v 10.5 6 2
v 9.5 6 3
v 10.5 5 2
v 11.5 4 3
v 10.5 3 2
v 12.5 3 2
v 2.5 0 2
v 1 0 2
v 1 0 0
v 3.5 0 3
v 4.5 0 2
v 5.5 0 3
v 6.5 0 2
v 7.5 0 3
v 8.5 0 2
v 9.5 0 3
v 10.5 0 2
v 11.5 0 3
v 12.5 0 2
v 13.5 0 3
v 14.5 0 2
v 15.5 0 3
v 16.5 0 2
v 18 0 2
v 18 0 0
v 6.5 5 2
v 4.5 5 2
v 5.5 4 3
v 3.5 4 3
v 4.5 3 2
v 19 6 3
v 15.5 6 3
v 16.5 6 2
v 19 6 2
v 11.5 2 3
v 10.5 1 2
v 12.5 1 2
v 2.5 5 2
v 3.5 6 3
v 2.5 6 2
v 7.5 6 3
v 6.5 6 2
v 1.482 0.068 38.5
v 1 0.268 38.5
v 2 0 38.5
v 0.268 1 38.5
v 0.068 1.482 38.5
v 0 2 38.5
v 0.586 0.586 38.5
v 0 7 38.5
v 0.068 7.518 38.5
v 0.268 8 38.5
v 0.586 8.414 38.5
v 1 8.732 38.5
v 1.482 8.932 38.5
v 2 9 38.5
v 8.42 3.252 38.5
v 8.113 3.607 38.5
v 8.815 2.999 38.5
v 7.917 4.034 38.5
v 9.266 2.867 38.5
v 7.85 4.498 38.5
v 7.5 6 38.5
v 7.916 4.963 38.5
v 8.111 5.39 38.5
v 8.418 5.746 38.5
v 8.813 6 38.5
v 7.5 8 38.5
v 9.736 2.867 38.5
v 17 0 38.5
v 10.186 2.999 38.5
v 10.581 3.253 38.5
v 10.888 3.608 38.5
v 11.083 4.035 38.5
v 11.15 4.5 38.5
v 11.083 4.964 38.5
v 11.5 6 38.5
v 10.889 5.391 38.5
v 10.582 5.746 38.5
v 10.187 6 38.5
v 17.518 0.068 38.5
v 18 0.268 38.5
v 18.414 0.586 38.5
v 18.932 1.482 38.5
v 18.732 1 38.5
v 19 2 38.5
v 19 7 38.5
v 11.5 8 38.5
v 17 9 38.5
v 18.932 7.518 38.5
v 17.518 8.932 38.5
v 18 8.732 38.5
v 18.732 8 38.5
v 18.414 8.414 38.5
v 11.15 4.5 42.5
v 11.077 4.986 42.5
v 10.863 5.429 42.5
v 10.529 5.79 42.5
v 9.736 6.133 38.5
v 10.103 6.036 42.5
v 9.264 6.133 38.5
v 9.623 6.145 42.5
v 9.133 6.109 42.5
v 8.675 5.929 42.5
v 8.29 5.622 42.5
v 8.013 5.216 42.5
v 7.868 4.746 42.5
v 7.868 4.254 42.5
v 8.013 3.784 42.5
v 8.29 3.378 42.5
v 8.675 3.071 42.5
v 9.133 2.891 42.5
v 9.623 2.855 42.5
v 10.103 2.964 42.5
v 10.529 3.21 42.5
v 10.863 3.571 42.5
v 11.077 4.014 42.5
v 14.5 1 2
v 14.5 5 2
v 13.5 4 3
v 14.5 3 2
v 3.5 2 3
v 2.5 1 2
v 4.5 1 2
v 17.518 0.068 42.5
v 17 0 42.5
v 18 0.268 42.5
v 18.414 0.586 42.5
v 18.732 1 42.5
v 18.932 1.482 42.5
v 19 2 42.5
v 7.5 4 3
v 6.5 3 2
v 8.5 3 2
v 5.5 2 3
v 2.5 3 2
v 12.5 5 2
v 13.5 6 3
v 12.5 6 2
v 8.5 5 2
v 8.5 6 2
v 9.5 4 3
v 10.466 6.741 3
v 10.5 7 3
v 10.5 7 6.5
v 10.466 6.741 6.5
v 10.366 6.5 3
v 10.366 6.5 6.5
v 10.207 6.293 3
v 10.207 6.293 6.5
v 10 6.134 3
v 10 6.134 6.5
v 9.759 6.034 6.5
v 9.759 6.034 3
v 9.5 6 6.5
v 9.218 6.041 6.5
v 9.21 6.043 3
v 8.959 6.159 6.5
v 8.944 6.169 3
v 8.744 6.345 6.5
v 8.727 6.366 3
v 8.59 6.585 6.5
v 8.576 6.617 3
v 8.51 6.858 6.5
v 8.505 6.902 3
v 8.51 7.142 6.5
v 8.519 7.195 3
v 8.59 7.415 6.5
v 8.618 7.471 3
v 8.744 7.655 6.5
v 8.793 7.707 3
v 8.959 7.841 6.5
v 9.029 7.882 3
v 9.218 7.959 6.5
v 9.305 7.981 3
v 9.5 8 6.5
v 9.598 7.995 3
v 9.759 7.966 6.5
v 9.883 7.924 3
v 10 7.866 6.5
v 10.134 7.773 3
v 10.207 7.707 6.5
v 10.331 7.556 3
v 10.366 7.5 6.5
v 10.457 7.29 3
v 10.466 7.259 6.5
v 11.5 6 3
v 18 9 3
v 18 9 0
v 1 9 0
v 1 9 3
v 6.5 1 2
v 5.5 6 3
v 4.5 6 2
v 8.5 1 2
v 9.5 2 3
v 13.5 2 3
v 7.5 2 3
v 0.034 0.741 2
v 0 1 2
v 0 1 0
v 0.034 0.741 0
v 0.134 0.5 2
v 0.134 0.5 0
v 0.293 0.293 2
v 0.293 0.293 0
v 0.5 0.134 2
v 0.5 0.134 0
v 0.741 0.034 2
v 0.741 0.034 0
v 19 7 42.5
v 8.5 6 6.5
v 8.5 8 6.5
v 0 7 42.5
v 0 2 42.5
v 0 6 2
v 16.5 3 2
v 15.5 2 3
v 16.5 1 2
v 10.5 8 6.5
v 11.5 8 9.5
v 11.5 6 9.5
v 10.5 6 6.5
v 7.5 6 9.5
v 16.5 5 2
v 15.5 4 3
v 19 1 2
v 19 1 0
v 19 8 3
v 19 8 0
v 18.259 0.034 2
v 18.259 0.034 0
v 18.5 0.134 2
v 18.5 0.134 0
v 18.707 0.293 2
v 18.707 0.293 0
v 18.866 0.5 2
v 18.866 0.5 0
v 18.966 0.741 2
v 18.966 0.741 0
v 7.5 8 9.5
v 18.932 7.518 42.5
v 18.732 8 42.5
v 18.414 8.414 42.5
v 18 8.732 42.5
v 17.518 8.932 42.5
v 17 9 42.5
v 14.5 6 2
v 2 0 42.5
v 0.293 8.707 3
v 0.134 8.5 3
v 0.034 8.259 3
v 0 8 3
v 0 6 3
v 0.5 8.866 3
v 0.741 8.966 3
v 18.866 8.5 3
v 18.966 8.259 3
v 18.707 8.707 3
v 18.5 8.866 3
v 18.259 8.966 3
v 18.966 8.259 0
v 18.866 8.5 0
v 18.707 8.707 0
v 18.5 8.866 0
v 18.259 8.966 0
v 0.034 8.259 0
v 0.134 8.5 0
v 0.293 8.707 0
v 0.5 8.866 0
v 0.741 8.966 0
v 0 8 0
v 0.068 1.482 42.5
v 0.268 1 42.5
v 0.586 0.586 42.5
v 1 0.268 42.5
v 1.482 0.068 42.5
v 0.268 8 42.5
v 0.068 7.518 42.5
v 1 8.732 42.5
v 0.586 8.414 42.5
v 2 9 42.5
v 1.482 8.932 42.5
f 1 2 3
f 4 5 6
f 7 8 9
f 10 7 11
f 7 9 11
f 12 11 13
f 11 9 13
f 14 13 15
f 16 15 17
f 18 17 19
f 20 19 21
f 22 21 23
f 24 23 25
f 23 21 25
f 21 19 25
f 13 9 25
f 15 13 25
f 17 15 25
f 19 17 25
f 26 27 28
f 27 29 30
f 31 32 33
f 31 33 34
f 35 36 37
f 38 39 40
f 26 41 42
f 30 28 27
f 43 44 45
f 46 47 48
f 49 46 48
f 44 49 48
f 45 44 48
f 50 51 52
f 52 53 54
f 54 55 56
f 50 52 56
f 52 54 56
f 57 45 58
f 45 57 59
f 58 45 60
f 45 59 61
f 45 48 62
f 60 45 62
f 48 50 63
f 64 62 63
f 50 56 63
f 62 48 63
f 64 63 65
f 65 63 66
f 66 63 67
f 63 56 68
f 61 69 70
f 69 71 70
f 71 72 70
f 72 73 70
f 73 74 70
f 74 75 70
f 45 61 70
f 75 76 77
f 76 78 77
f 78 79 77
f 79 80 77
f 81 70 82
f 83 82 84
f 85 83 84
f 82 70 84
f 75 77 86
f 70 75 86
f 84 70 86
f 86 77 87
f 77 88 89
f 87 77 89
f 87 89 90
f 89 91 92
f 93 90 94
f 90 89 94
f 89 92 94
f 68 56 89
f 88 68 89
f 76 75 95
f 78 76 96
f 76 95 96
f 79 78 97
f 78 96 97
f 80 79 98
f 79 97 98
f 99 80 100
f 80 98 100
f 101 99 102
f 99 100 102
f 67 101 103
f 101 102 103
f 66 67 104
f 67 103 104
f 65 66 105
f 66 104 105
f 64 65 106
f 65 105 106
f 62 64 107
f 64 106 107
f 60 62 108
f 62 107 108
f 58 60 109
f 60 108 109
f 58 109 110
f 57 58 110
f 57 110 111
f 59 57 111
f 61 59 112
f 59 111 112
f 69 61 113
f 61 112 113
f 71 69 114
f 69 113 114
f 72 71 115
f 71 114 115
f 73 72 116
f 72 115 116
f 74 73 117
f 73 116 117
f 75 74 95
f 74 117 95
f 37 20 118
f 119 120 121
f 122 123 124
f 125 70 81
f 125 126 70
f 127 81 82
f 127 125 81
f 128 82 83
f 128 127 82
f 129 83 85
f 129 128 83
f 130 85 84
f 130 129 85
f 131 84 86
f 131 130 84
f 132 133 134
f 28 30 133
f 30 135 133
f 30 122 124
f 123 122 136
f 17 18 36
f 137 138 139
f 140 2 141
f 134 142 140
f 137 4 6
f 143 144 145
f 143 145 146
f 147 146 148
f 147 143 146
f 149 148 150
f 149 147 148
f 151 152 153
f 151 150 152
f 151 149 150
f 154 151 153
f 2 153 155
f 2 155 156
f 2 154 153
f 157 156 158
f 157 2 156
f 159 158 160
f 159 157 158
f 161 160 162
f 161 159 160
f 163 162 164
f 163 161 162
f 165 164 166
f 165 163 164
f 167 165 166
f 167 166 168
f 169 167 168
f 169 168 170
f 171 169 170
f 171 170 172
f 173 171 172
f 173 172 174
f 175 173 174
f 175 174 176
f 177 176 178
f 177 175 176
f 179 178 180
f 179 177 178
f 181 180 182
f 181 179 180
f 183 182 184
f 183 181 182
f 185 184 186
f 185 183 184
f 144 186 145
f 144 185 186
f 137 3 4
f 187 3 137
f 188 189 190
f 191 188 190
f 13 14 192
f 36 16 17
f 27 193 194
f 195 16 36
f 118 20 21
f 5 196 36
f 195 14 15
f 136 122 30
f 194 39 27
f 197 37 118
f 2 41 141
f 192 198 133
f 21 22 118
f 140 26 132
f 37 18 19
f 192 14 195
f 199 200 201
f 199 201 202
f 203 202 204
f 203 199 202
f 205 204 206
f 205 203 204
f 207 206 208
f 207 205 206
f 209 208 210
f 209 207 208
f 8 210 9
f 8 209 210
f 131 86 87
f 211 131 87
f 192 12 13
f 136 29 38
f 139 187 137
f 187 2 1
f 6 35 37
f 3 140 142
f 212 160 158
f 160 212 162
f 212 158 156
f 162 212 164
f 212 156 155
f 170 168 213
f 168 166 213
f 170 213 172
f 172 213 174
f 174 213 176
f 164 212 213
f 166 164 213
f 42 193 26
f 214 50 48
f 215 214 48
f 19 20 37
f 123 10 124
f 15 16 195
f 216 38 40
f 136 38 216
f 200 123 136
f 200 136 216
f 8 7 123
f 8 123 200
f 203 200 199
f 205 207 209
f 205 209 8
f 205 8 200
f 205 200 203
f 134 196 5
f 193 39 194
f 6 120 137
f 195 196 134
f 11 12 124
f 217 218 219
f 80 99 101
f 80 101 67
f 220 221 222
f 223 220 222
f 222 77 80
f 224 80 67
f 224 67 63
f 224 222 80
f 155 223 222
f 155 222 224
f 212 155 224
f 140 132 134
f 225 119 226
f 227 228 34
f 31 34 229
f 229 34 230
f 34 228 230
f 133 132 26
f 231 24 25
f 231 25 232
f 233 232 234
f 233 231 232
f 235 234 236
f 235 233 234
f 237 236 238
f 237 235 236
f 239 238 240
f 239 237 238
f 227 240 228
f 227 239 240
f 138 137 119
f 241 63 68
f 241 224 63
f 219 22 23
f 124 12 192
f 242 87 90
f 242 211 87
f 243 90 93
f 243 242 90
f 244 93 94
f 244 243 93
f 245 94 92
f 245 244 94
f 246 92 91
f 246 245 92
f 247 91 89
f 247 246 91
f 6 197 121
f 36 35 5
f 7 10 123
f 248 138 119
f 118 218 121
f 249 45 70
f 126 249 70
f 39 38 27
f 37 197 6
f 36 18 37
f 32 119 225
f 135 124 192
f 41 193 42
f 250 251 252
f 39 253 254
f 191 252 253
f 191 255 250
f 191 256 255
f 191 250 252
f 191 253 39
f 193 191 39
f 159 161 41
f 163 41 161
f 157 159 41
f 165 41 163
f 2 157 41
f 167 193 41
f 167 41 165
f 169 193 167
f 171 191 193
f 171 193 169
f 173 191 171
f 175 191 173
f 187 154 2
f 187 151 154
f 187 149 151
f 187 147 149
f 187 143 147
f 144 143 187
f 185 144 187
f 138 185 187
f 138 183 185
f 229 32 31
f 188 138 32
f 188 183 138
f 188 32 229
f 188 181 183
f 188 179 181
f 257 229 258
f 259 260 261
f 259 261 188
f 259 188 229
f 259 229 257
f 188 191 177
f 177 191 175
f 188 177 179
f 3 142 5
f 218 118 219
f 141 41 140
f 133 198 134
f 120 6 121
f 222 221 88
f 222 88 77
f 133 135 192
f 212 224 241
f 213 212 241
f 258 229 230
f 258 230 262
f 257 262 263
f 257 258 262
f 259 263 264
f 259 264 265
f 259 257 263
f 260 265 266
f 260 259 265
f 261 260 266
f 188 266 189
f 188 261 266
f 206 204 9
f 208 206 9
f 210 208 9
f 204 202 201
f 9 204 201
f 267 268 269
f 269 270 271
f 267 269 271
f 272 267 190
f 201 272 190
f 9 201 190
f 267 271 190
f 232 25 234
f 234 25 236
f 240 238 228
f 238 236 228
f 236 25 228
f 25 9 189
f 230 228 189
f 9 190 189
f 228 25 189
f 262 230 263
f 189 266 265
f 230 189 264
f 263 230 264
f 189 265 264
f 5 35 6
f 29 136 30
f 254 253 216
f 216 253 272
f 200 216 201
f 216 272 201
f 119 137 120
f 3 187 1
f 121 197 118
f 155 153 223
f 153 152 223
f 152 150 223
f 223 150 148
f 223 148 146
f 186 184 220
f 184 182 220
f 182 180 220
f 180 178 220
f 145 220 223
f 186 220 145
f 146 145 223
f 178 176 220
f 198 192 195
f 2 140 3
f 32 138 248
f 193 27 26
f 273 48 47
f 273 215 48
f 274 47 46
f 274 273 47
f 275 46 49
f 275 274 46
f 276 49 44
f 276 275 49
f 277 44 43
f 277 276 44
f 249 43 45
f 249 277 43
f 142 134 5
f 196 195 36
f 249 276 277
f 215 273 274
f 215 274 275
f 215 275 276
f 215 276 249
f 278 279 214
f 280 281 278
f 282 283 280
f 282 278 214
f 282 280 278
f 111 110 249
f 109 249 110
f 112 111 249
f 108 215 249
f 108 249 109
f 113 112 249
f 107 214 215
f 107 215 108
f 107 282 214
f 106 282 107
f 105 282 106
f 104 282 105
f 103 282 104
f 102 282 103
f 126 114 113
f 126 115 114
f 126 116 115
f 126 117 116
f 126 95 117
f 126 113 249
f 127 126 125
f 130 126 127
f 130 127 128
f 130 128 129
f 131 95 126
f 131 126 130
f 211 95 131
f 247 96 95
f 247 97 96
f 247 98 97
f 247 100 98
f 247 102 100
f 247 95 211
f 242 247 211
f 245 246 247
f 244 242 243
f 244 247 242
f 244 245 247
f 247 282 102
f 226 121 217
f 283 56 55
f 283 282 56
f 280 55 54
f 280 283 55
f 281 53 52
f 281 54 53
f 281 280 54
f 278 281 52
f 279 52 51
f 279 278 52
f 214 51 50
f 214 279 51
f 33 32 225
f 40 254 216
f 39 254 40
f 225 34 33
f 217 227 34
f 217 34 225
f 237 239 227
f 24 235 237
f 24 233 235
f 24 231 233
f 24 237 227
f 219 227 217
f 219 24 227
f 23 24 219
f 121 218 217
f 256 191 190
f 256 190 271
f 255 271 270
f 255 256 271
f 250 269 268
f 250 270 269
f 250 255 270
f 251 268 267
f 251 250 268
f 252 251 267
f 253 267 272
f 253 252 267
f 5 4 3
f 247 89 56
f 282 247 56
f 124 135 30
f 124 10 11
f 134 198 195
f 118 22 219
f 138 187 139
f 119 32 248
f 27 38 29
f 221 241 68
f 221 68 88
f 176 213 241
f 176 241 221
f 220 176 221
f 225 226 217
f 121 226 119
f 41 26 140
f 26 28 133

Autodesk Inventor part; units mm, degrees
ref_plane "YZ Plane" through (0, 0, 0) normal (1, 0, 0) x (0, 1, 0)
ref_plane "XZ Plane" through (0, 0, 0) normal (0, 1, 0) x (-1, 0, 0)
ref_plane "XY Plane" through (0, 0, 0) normal (0, 0, 1) x (1, 0, 0)
sketch "Sketch1" plane through (0, 0, 0) normal (0, 0, 1) x (1, 0, 0)
  line L0 (0, 0) -> (19, 0)
  line L1 (19, 0) -> (19, 9)
  line L2 (19, 9) -> (0, 9)
  line L3 (0, 9) -> (0, 0)
  point P0 (9.5, 9)
  dimension "d0" = 19
  dimension "d1" = 9
extrude "Extrusion1" add sketch "Sketch1" along normal blind 3
sketch "Sketch2" plane through (0, 0, 3) normal (0, 0, 1) x (1, 0, 0)
  line L0 (19, 9) -> (0, 9) projected
  circle A0 centre (9.5, 7) radius 1
  point P0 (0, 0)
  point P1 (9.5, 9)
  dimension "d4" = 2
  dimension "d5" = 2
extrude "Extrusion2" add sketch "Sketch2" along normal blind 3.5
sketch "Sketch6" plane through (9.5, 7, 6.5) normal (0, 0, 1) x (1, 0, 0)
  circle A0 centre (0, 0) radius 1 projected
  line L0 (2, -1) -> (-2, -1)
  line L1 (-2, -1) -> (-2, 1)
  line L2 (-2, 1) -> (2, 1)
  line L3 (2, 1) -> (2, -1)
  line L4 (2, -1) -> (-2, 1) construction
  line L5 (-2, -1) -> (2, 1) construction
  point P0 (-9.5, -7)
  dimension "d13" = 4
extrude "Extrusion5" add sketch "Sketch6" along normal blind 32
sketch "Sketch7" plane through (9.5, 7, 38.5) normal (0, 0, 1) x (1, 0, 0)
  circle A0 centre (0, 0) radius 1 projected
  line L0 (-9.5, -7) -> (9.5, -7) projected
  line L1 (9.5, -7) -> (9.5, 2) projected
  line L2 (9.5, 2) -> (-9.5, 2) projected
  line L3 (-9.5, 2) -> (-9.5, -7) projected
  arc A1 (0, -1) -> (0, 1) centre (0, 0) ccw projected
  arc A2 (0, 1) -> (0, -1) centre (0, 0) ccw projected
extrude "Extrusion6" add sketch "Sketch7" along normal blind 4 contours A0 | L3 L2 L1 L0
sketch "Sketch8" plane through (9.5, 7, 42.5) normal (0, 0, 1) x (1, 0, 0)
  line L0 (-9.5, -7) -> (9.5, -7) projected
  line L1 (9.5, -7) -> (9.5, 2) projected
  line L2 (9.5, 2) -> (-9.5, 2) projected
  line L3 (-9.5, 2) -> (-9.5, -7) projected
  circle A0 centre (0, -2.5) radius 1.65
  dimension "d18" = 3.3
extrude "Extrusion7" cut sketch "Sketch8" against normal blind 4 contours A0
sketch "Sketch10" plane through (0, 0, 0) normal (-1, 0, 0) x (0, 0, 1)
  line L0 (0, 0) -> (3, 0) projected
  line L1 (3, 9) -> (3, 0) projected
  line L2 (3, 0) -> (2, 0)
  line L3 (2, 0) -> (2, 6)
  line L4 (2, 6) -> (3, 6)
  line L5 (3, 6) -> (3, 0)
  line L6 (3, 0) -> (2, 1)
  line L7 (3, 0) -> (4.4142, 0) construction
  line L8 (2, 1) -> (3, 2)
  line L9 (3, 0) -> (3, 9) projected
  line L10 (3, 2) -> (2, 3)
  line L11 (2, 3) -> (3, 4)
  line L12 (2, 5) -> (3, 4)
  line L13 (2, 5) -> (3, 6)
  dimension "d23" = 1
  dimension "d24" = 6
  dimension "d25" = 135
  dimension "d26" = 90
extrude "Extrusion8" cut sketch "Sketch10" against normal up to next contours L6 L8 L1 | L10 L11 L1 | L12 L13 L1
sketch "Sketch11" plane through (0, 0, 0) normal (0, -1, 0) x (1, 0, 0)
  line L0 (0, 3) -> (9.5, 3) projected
  line L1 (0, 3) -> (19, 3)
  line L2 (19, 3) -> (19, 2)
  line L3 (19, 2) -> (8.5, 2)
  line L4 (0, 2) -> (0, 3)
  line L5 (0, 3) -> (0, 2) projected
  line L6 (0, 3) -> (1.4142, 3) construction
  line L7 (19, 3) -> (0, 3) projected
  line L8 (9.5, 3) -> (8.5, 2)
  line L9 (9.5, 3) -> (10.9142, 3) construction
  line L10 (10.5, 2) -> (8.5, 2)
  line L11 (9.5, 3) -> (10.5, 2)
  line L12 (10.5, 2) -> (8.5, 2)
  line L13 (8.5, 2) -> (0, 2)
  line L14 (7.5, 3) -> (8.5, 2)
  line L15 (8.5, 2) -> (6.5, 2)
  line L16 (7.5, 3) -> (6.5, 2)
  line L17 (5.5, 3) -> (6.5, 2)
  line L18 (6.5, 2) -> (4.5, 2)
  line L19 (5.5, 3) -> (4.5, 2)
  line L20 (3.5, 3) -> (4.5, 2)
  line L21 (4.5, 2) -> (2.5, 2)
  line L22 (3.5, 3) -> (2.5, 2)
  line L23 (12.5, 2) -> (10.5, 2)
  line L24 (11.5, 3) -> (12.5, 2)
  line L25 (11.5, 3) -> (10.5, 2)
  line L26 (14.5, 2) -> (12.5, 2)
  line L27 (13.5, 3) -> (14.5, 2)
  line L28 (13.5, 3) -> (12.5, 2)
  line L29 (16.5, 2) -> (14.5, 2)
  line L30 (15.5, 3) -> (16.5, 2)
  line L31 (15.5, 3) -> (14.5, 2)
  point P0 (0, 0)
  dimension "d30" = 135
  dimension "d33" = 2
  dimension "d40" = 2
extrude "Extrusion9" cut sketch "Sketch11" against normal blind 6 contours L0 L22 L13 L4 | L0 L19 L20 | L0 L16 L17 | L0 L8 L14 | L1 L25 L11 | L1 L28 L24 | L1 L31 L27 | L1 L2 L3 L30
fillet "Fillet2" radius 1 4 edges at (19, 0, 1) (19, 9, 1.5) (0, 0, 1) (0, 9, 1.5)
fillet "Fillet3" radius 2 4 edges at (19, 0, 40.5) (19, 9, 40.5) (0, 0, 40.5) (0, 9, 40.5)
chamfer "Chamfer1" distance 1 distance2 3 1 edges at (7.5, 7, 6.5) measured on face at (7.8358, 6.9598, 6.5)
chamfer "Chamfer2" distance 1 distance2 3 1 edges at (11.5, 7, 6.5) measured on face at (11.1667, 7, 6.5)
properties part number "gravity-clamp-base9x19mm-part1"
